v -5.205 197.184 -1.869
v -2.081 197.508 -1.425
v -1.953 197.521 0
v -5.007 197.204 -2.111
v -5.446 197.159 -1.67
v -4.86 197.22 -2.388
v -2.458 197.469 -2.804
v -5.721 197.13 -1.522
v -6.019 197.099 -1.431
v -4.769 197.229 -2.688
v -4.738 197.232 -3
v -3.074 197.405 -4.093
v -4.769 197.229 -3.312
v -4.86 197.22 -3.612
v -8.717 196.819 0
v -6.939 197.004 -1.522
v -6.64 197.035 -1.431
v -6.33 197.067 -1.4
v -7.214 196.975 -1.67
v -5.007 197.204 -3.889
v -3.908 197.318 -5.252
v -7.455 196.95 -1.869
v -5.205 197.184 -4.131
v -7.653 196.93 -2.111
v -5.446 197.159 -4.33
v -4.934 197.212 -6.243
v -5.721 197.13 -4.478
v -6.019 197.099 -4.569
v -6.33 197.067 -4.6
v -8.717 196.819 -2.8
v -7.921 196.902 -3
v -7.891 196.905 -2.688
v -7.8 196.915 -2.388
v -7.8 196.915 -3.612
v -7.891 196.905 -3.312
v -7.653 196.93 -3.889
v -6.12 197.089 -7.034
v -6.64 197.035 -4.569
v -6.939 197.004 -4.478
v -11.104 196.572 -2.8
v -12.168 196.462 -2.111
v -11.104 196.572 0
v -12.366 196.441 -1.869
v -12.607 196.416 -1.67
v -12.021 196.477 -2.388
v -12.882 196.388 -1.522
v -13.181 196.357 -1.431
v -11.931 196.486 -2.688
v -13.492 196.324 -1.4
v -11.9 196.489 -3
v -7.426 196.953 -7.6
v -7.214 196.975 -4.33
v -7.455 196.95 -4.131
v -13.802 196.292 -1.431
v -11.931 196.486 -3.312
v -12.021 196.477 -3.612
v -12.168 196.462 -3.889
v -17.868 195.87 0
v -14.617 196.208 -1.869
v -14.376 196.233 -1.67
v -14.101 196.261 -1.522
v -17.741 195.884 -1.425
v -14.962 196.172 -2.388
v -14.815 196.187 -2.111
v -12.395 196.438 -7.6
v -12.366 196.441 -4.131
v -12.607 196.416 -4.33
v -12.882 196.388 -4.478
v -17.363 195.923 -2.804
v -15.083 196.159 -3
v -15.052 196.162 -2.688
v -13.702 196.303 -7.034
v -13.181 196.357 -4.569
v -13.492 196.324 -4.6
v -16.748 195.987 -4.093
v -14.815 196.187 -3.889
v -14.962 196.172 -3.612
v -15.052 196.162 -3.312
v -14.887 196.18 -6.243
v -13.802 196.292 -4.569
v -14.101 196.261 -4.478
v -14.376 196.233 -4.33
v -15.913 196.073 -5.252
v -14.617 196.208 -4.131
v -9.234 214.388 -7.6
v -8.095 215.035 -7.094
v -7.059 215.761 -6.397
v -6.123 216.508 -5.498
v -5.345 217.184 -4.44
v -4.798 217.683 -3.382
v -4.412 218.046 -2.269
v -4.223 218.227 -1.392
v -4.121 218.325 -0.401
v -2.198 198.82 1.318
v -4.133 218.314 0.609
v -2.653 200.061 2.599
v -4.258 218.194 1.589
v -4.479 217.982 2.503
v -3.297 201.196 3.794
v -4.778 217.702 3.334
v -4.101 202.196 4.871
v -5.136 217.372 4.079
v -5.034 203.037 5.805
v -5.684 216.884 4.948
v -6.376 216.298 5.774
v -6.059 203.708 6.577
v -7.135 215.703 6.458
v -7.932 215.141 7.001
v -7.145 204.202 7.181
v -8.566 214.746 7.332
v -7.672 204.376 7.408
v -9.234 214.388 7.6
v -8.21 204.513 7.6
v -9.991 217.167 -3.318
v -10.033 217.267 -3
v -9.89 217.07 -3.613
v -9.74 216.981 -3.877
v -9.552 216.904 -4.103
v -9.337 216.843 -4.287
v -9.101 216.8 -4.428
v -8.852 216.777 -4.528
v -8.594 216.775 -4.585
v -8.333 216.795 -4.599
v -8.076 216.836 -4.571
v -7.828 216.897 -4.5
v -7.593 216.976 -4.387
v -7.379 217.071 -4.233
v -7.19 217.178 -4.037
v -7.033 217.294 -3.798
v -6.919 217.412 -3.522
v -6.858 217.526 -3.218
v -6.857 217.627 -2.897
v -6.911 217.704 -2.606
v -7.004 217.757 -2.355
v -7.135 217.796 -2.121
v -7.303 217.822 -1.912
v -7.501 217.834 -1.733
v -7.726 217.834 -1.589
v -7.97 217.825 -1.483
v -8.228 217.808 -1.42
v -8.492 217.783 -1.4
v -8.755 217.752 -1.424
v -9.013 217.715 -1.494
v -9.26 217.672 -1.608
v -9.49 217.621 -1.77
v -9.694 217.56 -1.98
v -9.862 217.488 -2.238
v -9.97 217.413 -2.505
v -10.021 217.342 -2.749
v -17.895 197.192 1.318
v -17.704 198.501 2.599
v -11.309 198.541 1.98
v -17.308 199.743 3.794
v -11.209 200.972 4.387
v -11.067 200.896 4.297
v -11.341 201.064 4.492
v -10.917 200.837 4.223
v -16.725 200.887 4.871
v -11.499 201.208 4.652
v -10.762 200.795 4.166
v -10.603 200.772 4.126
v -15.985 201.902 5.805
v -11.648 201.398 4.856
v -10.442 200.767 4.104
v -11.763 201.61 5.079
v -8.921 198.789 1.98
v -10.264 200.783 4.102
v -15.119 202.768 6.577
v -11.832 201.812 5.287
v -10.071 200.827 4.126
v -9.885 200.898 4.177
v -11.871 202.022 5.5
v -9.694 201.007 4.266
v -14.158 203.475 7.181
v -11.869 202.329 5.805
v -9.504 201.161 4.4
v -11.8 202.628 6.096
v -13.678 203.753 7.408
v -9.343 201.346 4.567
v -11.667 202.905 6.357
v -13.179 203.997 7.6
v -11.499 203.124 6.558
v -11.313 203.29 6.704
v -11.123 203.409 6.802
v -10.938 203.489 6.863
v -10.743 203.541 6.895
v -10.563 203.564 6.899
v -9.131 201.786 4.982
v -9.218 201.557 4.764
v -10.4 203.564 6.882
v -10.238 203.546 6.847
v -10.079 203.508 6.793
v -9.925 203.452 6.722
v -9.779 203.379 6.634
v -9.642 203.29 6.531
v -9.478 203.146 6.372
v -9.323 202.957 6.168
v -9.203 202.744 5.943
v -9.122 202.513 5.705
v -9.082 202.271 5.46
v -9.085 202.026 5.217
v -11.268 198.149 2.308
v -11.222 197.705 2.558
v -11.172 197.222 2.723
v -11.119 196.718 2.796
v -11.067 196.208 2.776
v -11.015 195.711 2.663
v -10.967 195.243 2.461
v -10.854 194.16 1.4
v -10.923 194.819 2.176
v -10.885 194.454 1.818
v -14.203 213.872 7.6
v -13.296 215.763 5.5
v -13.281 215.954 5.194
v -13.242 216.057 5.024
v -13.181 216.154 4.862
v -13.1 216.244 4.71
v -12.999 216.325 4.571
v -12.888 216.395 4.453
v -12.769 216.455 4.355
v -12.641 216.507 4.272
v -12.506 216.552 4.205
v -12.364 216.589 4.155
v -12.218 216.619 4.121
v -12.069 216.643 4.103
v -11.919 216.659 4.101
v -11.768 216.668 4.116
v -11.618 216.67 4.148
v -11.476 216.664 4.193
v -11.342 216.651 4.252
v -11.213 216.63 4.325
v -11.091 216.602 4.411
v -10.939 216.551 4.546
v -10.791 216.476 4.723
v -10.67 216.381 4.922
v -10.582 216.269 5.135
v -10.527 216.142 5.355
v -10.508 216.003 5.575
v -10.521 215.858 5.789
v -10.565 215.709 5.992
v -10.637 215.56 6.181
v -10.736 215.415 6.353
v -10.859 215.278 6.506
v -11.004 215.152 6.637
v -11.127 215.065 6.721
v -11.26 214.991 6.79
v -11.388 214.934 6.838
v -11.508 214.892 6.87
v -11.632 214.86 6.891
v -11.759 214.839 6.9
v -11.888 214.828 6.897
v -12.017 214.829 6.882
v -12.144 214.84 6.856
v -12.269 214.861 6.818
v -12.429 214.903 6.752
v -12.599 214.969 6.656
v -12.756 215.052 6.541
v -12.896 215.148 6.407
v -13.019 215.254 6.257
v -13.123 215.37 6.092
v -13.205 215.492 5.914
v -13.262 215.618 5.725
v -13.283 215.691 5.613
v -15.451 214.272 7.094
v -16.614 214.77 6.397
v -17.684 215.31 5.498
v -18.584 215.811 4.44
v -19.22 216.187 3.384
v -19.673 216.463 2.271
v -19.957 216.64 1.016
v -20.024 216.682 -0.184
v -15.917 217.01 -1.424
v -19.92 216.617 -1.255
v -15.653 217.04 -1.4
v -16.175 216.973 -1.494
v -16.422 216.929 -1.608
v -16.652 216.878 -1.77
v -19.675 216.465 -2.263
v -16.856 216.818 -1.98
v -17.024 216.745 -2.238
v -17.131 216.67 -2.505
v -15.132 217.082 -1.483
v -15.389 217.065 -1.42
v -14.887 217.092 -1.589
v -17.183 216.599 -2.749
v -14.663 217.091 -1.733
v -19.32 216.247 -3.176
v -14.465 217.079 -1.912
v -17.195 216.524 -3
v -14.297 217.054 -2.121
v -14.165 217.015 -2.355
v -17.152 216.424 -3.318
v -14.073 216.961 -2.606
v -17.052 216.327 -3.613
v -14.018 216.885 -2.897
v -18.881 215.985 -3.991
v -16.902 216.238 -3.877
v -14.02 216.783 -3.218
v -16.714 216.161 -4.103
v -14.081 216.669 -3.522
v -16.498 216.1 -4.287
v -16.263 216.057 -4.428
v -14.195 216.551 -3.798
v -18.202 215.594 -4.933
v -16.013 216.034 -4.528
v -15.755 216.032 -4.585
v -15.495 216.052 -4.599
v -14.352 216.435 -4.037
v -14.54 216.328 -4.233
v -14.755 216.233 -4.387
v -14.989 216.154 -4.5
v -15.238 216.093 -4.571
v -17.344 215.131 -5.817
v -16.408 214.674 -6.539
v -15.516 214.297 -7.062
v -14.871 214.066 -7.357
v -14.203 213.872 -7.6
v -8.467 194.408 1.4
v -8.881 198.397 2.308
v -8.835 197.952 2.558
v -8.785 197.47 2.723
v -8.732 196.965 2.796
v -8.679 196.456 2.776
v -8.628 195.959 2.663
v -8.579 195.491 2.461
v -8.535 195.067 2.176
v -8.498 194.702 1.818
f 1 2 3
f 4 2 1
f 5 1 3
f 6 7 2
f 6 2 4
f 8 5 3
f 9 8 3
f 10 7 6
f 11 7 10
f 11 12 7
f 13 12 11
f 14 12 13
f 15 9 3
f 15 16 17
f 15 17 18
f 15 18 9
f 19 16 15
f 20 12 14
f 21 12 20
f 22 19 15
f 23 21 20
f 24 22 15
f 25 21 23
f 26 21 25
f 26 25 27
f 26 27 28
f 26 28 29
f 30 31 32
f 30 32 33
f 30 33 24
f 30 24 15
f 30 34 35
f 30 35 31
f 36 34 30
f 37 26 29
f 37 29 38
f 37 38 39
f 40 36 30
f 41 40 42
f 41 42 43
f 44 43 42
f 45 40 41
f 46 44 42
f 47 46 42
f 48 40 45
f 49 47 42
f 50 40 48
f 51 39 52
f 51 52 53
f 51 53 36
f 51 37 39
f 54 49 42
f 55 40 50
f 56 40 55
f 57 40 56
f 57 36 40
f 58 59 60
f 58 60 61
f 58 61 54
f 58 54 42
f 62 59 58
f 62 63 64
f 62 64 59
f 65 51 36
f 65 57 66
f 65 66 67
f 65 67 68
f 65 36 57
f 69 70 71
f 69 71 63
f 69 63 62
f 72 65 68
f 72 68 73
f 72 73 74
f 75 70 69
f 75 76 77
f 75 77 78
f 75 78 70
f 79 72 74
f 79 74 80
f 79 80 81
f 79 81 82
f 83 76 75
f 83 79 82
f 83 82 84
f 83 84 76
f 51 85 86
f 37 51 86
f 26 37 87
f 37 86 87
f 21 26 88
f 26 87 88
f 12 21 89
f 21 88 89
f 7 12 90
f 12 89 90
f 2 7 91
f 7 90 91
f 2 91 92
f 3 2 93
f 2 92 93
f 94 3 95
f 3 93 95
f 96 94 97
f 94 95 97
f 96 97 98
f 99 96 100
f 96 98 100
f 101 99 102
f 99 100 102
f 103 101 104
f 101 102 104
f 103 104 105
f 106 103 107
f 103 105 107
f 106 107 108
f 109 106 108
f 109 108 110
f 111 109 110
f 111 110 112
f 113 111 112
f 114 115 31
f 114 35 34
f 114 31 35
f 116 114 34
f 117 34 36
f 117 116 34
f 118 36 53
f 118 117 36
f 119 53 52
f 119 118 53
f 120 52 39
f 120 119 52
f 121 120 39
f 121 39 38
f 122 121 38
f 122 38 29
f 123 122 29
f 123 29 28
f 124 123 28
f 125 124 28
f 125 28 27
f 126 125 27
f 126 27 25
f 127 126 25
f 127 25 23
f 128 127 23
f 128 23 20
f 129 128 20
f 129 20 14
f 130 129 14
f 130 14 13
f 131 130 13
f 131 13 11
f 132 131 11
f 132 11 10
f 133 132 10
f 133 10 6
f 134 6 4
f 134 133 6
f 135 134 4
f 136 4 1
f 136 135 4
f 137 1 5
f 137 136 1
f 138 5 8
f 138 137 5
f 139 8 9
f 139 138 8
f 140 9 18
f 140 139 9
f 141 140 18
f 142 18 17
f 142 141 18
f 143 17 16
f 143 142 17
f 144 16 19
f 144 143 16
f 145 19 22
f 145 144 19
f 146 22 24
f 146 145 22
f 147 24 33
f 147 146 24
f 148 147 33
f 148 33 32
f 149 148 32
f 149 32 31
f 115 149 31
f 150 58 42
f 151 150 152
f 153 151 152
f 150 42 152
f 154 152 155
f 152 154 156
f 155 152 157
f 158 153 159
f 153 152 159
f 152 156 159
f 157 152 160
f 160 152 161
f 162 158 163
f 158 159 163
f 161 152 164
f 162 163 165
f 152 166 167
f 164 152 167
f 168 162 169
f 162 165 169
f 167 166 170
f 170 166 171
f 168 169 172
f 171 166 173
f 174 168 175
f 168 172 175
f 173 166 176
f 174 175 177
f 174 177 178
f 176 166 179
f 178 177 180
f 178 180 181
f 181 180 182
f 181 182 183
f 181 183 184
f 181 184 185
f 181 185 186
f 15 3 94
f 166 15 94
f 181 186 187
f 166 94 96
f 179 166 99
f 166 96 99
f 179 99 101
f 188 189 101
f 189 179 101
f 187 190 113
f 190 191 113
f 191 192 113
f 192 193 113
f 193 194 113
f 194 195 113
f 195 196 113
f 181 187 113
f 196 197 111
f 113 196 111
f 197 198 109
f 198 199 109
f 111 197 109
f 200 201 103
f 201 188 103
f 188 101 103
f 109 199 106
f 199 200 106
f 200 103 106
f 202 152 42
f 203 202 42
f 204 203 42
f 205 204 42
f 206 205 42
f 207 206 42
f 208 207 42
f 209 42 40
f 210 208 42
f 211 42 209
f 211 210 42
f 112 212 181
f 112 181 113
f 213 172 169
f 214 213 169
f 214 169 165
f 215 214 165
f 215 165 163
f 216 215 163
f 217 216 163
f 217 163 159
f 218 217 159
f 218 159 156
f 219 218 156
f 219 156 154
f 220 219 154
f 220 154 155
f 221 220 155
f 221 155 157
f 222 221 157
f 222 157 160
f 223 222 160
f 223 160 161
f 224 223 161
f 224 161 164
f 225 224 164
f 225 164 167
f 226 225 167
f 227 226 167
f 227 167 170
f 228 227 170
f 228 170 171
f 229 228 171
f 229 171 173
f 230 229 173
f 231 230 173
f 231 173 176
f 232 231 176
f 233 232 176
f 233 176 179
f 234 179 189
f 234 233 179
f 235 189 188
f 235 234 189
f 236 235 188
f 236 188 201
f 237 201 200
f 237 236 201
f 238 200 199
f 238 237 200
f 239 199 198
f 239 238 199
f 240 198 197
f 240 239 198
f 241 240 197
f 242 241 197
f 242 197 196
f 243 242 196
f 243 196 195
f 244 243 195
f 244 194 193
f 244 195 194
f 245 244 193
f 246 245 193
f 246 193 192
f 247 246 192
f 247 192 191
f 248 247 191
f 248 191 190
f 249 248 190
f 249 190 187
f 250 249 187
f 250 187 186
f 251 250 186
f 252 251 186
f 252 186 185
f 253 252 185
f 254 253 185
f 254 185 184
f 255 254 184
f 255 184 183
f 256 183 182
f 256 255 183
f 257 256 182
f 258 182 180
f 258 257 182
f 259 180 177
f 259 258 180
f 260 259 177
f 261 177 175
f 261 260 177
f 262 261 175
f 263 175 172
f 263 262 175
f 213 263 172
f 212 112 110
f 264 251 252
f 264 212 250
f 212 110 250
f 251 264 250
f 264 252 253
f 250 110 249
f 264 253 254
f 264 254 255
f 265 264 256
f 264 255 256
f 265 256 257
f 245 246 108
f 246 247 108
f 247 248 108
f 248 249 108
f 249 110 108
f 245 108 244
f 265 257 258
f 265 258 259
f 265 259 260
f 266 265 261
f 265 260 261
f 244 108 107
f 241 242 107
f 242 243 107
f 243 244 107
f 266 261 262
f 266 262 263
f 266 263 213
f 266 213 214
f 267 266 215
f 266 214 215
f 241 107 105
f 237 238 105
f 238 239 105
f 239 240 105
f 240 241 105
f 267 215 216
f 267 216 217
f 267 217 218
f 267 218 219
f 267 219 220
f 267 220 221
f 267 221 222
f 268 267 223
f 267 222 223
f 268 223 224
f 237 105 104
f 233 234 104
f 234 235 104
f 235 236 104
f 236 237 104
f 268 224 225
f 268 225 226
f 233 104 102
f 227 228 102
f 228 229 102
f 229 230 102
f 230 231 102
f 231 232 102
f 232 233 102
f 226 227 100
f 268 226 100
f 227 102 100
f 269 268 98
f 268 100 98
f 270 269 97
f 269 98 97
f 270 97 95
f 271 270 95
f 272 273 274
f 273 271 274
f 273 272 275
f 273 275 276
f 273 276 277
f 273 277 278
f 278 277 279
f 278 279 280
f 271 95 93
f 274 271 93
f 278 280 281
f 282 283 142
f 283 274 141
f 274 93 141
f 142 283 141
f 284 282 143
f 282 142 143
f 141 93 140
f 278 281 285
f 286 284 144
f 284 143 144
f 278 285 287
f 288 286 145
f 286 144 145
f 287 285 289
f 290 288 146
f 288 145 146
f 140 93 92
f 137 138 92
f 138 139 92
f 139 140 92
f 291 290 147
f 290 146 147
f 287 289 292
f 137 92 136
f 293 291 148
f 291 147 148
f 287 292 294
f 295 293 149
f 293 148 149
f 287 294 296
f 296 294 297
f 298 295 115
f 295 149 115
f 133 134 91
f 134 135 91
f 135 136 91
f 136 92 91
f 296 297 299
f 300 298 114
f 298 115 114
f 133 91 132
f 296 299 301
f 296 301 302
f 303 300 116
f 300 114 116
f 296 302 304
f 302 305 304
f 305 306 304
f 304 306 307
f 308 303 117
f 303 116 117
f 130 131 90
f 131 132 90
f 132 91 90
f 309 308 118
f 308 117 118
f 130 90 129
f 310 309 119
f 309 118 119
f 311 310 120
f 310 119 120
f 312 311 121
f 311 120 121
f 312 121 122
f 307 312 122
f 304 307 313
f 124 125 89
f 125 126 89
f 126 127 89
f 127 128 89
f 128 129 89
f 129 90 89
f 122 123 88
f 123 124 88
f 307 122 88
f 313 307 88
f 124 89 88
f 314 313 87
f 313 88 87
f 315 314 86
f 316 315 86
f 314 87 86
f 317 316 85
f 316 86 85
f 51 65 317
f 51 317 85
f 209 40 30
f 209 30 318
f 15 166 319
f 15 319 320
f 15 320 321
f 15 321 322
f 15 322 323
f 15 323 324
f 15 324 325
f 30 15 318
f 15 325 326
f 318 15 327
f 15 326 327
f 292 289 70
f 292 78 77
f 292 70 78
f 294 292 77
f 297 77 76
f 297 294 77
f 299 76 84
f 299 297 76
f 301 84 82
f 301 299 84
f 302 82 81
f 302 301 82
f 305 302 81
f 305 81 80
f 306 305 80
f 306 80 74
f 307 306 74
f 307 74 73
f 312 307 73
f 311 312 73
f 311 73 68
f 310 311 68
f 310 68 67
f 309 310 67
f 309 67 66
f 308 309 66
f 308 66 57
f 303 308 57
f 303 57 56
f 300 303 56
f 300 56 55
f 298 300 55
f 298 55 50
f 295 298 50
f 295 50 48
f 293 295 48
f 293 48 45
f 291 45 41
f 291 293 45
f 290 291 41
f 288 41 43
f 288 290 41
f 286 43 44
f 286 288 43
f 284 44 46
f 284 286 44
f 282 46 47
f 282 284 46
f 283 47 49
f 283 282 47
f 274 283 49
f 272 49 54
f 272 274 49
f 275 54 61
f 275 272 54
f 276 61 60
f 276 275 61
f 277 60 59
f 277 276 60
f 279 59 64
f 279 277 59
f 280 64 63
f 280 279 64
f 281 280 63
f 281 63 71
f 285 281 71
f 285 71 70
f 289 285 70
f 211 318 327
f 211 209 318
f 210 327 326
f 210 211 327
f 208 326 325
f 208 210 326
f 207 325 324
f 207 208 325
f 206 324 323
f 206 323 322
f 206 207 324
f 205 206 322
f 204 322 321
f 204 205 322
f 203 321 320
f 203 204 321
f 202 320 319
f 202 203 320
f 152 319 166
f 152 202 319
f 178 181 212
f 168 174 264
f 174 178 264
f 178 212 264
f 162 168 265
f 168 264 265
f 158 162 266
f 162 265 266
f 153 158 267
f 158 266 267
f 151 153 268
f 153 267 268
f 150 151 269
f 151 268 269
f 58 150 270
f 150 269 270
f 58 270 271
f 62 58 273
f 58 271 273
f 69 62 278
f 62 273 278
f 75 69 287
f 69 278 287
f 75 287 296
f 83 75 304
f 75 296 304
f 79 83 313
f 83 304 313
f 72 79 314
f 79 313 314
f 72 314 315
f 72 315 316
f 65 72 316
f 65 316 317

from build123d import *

# Parameters (mm, degrees)
SKETCH3_R               = 8
BOSS_EXTRUDE1_DEPTH     = 21.052631579
CUT_EXTRUDE1_DEPTH      = 11.160006171
CUT_EXTRUDE1_DEPTH_BACK = 11.160006171
CUT_EXTRUDE2_DEPTH      = 11.146902499
CUT_EXTRUDE2_DEPTH_BACK = 11.1469025
BOSS_EXTRUDE3_DEPTH     = 1.2
SKETCH8_R               = 1.6
SKETCH8_R_2             = 1.4
CUT_EXTRUDE3_DEPTH      = 25.395624714
CUT_EXTRUDE3_DEPTH_BACK = 2.513887999
CUT_EXTRUDE4_DEPTH      = 23.566519578


with BuildPart() as part:
    # Sketch3 → Boss-Extrude1 (new body)
    with BuildSketch(Plane(origin=(-12.082314344, 217.636022384, 0), x_dir=(-0.994665758, -0.103150523, 0), z_dir=(0.103150523, -0.994665758, 0))):
        Circle(SKETCH3_R)
    extrude(amount=BOSS_EXTRUDE1_DEPTH)

    # Sketch4 → Cut-Extrude1 (cut, two sides)
    with BuildSketch(Plane(origin=(10.375761543, 1.076004901, 0), x_dir=(0.103150523, -0.994665758, 0), z_dir=(-0.994665758, -0.103150523, 0))) as cut_extrude1_sk:
        with BuildLine():
            Line((-217.721396158, 8), (-213.721396158, 8))
            ThreePointArc((-213.721396158, 8), (-217.59367935, 0), (-213.721396158, -8))
            Line((-213.721396158, -8), (-217.721396158, -8))
            Line((-217.721396158, -8), (-217.721396158, 8))
        make_face()
    extrude(amount=CUT_EXTRUDE1_DEPTH, mode=Mode.SUBTRACT)
    extrude(cut_extrude1_sk.sketch, amount=-CUT_EXTRUDE1_DEPTH_BACK, mode=Mode.SUBTRACT)

    # Sketch5 → Cut-Extrude2 (cut, two sides)
    with BuildSketch(Plane(origin=(10.375761543, 1.076004901, 0), x_dir=(0.103150523, -0.994665758, 0), z_dir=(-0.994665758, -0.103150523, 0))) as cut_extrude2_sk:
        Polygon((-196.668764579, 0), (-204.668764579, 8), (-196.668764579, 8), align=None)
    extrude(amount=CUT_EXTRUDE2_DEPTH, mode=Mode.SUBTRACT)
    extrude(cut_extrude2_sk.sketch, amount=-CUT_EXTRUDE2_DEPTH_BACK, mode=Mode.SUBTRACT)

    # Sketch7 → Boss-Extrude3 (add, symmetric)
    with BuildSketch(Plane(origin=(10.375761543, 1.076004901, 0), x_dir=(0.103150523, -0.994665758, 0), z_dir=(-0.994665758, -0.103150523, 0))):
        with BuildLine():
            Line((-198.648663566, 1.979898987), (-196.668764579, 0))
            Line((-196.668764579, 0), (-196.668764579, -2.8))
            Line((-196.668764579, -2.8), (-194.243893448, 1.4))
            ThreePointArc((-194.243893448, 1.4), (-196.303291241, 2.776045612), (-198.648663566, 1.979898987))
        make_face()
    extrude(amount=BOSS_EXTRUDE3_DEPTH, both=True)

    # Sketch8 → Cut-Extrude3 (cut, two sides)
    with BuildSketch(Plane(origin=(-12.082314344, 217.636022384, 0), x_dir=(-0.994665758, -0.103150523, 0), z_dir=(0.103150523, -0.994665758, 0))) as cut_extrude3_sk:
        with Locations((-3.6, 3)):
            Circle(SKETCH8_R)
        with Locations((3.6, 3)):
            Circle(SKETCH8_R)
        with Locations((0, -5.5)):
            Circle(SKETCH8_R_2)
    extrude(amount=CUT_EXTRUDE3_DEPTH, mode=Mode.SUBTRACT)
    extrude(cut_extrude3_sk.sketch, amount=-CUT_EXTRUDE3_DEPTH_BACK, mode=Mode.SUBTRACT)

    # Sketch9 → Cut-Extrude4 (cut, through all)
    with BuildSketch(Plane(origin=(-20.286485929, 195.619685742, 0), x_dir=(0.994665758, 0.103150523, 0), z_dir=(0.103150523, -0.994665758, 0))):
        with BuildLine():
            Line((7.933405986, -7.6), (12.929404385, -7.6))
            ThreePointArc((12.929404385, -7.6), (10.431405186, -8), (7.933405986, -7.6))
        make_face()
        with BuildLine():
            Line((7.933405986, 7.6), (12.929404385, 7.6))
            ThreePointArc((12.929404385, 7.6), (10.431405186, 8), (7.933405986, 7.6))
        make_face()
    extrude(amount=-CUT_EXTRUDE4_DEPTH, mode=Mode.SUBTRACT)


solid = part.part
